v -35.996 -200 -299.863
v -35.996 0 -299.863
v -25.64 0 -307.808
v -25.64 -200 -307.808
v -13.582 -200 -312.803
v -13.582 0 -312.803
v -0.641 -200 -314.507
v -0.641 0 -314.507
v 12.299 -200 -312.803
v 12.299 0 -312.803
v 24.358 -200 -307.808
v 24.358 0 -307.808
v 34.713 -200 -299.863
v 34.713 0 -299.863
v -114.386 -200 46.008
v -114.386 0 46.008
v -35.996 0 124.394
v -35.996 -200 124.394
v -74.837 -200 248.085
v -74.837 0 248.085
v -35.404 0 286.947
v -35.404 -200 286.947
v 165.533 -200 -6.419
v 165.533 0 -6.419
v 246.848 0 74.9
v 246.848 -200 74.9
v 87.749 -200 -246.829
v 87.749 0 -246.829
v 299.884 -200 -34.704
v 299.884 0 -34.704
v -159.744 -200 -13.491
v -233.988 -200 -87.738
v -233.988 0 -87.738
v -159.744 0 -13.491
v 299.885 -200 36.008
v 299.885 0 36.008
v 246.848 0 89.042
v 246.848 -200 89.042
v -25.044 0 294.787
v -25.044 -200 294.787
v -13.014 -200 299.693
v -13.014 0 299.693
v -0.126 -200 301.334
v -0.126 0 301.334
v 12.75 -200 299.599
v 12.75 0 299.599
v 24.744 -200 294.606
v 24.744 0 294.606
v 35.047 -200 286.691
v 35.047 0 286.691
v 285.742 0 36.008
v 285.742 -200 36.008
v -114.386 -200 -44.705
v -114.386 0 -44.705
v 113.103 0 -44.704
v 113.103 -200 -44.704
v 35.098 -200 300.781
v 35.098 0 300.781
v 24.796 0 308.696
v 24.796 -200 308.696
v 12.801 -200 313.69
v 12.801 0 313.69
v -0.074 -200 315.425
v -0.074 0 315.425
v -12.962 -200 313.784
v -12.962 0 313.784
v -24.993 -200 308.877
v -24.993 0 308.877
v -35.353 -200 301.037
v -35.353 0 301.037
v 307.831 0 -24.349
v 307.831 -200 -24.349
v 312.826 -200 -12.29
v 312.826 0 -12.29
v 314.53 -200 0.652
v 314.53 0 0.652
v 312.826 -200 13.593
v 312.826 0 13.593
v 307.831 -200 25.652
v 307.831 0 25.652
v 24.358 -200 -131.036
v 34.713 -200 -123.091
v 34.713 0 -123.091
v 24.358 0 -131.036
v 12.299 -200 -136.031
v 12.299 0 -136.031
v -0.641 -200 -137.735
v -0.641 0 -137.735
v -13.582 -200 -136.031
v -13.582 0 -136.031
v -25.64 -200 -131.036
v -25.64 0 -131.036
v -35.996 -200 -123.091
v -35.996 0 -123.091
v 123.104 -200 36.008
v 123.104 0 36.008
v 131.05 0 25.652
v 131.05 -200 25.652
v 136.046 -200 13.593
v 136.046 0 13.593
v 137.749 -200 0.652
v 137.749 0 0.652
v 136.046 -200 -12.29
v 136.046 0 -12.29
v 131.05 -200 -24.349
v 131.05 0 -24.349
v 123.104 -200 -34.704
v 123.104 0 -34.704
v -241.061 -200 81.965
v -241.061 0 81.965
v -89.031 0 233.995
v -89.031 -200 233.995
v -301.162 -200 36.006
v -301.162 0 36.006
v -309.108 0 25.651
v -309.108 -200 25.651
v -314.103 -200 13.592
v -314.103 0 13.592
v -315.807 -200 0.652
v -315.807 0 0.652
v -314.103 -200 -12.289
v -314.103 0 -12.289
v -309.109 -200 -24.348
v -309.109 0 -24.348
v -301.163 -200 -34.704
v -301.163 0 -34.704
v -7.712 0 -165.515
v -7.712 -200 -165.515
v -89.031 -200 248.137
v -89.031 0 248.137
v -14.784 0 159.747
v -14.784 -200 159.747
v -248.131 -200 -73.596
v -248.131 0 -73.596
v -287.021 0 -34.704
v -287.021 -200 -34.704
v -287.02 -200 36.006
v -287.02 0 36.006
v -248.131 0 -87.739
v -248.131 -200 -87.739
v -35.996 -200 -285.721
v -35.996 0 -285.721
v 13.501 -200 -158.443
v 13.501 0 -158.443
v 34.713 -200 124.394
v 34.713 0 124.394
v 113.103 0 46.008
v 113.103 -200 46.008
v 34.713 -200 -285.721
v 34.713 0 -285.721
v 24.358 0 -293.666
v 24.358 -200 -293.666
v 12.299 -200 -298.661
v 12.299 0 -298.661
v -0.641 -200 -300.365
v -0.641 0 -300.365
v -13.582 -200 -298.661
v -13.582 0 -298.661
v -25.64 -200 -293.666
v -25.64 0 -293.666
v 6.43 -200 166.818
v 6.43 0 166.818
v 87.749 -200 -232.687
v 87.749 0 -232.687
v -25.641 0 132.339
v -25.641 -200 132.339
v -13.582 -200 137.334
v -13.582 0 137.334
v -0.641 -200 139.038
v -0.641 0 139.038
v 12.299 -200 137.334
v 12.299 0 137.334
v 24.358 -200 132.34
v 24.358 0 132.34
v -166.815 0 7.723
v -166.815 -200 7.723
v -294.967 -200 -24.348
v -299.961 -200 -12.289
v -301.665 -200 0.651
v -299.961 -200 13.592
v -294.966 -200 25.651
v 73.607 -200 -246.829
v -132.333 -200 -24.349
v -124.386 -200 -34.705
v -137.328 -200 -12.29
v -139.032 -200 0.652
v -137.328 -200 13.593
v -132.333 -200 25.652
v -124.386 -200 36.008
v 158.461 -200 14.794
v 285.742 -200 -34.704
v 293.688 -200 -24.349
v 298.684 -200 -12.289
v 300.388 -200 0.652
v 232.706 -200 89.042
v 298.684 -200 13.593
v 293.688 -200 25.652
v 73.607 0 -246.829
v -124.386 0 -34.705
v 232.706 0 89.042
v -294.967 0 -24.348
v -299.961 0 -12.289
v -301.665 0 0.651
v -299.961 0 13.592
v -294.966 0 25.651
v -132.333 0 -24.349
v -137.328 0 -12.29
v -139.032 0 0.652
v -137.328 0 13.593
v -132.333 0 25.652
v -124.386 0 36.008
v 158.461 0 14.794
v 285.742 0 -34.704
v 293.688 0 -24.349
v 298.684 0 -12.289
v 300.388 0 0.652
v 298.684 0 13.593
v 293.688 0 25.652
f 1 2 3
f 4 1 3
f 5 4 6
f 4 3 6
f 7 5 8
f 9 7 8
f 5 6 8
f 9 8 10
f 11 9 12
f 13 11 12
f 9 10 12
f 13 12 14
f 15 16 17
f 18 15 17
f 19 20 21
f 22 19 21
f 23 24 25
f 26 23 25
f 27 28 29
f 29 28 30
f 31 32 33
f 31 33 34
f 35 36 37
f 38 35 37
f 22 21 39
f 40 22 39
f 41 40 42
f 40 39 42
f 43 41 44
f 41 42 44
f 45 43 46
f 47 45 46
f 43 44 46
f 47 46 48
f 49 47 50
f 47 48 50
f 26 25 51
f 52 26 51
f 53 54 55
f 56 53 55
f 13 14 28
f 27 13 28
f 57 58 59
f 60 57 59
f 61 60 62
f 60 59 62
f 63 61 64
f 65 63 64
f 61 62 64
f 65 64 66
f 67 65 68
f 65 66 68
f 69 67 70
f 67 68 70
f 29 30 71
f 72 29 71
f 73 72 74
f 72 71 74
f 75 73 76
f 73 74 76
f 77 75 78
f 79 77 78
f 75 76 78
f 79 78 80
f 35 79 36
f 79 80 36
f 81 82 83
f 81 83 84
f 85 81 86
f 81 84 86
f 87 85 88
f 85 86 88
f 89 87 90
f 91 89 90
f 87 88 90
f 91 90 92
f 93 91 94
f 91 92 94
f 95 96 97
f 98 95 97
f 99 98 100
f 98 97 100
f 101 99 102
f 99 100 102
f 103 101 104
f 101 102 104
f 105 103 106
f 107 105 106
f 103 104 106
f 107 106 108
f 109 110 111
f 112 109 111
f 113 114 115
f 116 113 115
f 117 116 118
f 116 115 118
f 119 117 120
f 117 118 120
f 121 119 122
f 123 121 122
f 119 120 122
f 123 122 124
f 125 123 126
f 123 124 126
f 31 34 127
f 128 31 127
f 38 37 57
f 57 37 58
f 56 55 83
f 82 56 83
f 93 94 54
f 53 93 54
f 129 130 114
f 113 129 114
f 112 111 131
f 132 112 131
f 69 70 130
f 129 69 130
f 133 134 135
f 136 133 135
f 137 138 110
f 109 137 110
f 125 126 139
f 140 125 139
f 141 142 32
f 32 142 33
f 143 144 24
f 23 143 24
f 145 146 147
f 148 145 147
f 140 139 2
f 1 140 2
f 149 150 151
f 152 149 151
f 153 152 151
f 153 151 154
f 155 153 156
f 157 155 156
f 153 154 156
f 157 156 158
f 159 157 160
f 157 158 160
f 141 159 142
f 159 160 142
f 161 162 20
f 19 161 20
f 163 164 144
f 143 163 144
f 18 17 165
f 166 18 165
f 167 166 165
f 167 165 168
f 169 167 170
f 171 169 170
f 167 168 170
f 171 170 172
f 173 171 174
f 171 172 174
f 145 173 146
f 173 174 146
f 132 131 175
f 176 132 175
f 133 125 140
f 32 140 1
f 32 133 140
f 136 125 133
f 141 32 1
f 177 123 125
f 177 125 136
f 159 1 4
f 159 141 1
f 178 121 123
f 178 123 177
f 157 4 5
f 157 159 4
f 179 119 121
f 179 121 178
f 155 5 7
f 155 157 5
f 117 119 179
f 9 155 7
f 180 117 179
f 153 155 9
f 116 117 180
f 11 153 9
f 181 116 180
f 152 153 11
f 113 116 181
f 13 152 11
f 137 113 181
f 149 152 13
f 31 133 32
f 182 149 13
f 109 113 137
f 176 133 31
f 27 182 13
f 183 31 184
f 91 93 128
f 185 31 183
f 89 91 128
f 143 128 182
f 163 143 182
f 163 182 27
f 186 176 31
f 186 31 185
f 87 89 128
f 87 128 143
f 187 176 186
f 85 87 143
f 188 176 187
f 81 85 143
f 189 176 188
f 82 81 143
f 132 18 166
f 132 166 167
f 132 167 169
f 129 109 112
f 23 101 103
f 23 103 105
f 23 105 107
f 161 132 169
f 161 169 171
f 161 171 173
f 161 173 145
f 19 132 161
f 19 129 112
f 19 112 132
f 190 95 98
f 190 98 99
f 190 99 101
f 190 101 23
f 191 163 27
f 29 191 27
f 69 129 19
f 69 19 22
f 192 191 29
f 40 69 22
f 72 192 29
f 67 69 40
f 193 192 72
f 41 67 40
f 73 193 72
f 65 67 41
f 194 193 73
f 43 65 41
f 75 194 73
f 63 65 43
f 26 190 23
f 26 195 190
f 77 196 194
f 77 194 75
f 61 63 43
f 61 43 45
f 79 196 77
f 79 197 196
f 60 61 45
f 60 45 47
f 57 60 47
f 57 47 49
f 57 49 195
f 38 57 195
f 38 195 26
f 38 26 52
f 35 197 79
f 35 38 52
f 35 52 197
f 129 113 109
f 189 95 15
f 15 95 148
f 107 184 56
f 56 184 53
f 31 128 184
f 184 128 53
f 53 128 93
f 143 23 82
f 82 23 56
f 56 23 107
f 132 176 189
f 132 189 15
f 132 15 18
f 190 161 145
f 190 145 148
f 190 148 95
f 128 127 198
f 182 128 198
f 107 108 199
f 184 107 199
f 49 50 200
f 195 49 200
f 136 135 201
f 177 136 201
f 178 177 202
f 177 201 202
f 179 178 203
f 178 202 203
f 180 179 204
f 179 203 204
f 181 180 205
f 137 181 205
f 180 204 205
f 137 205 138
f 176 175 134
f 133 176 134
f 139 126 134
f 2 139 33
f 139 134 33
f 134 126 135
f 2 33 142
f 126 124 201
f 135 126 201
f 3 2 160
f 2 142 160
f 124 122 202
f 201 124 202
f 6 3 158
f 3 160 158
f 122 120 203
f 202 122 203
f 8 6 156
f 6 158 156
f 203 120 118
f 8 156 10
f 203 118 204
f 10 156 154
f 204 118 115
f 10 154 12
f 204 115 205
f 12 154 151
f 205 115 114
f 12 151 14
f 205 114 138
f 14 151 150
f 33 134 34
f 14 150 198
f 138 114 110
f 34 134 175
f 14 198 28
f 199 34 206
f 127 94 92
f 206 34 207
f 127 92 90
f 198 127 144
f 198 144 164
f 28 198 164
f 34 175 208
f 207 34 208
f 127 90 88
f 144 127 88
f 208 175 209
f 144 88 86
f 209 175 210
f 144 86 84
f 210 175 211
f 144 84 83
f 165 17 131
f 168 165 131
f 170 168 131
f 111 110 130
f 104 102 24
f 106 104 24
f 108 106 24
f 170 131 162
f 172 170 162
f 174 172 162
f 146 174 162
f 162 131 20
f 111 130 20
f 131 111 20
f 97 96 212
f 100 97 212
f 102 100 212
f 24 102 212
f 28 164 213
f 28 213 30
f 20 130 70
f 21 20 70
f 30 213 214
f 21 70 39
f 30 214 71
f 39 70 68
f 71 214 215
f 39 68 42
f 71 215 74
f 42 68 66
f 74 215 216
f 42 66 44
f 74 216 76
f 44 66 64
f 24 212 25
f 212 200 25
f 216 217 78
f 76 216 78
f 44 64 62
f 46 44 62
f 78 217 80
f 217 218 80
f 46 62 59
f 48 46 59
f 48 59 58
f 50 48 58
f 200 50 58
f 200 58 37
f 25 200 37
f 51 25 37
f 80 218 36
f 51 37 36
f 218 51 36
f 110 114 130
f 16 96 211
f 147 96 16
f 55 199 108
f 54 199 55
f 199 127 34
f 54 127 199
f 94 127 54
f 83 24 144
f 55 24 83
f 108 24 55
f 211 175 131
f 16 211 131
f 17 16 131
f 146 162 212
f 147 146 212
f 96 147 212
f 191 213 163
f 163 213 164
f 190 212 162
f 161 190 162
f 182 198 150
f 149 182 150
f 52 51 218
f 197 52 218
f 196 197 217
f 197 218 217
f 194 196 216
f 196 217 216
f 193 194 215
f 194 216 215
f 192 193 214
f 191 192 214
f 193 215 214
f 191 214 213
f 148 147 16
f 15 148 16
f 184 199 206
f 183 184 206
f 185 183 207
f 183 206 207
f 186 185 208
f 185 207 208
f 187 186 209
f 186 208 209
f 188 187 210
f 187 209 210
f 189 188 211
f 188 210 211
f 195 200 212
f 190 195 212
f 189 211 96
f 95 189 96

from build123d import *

# Parameters (mm, degrees)
F1_DEPTH = 200
F2_DEPTH = 200


with BuildPart() as f1:
    # F0 (on Front) → F1 (new body)
    with BuildSketch(Plane.XZ):
        with BuildLine():
            Line((299.884558, 36.007969), (246.847851, 89.042397))
            Line((246.847851, 89.042397), (35.098199, 300.781197))
            ThreePointArc((35.098199, 300.781197), (-0.074387, 315.424621), (-35.352556, 301.037423))
            Line((-35.352556, 301.037423), (-89.03118, 248.136791))
            Line((-89.03118, 248.136791), (-301.162203, 36.006278))
            ThreePointArc((-301.162203, 36.006278), (-315.806906, 0.651524), (-301.16309, -34.703597))
            Line((-301.16309, -34.703597), (-248.130547, -87.738676))
            Line((-248.130547, -87.738676), (-35.995554, -299.862797))
            ThreePointArc((-35.995554, -299.862797), (-0.641078, -314.506552), (34.713373, -299.862736))
            Line((34.713373, -299.862736), (87.7494, -246.829244))
            Line((87.7494, -246.829244), (299.884472, -34.704314))
            ThreePointArc((299.884472, -34.704314), (314.529978, 0.651809), (299.884558, 36.007969))
        make_face()
        with BuildLine():
            Line((73.606909, -246.829261), (34.71336, -285.72095))
            ThreePointArc((34.71336, -285.72095), (-0.64109, -300.364766), (-35.995566, -285.721011))
            Line((-35.995566, -285.721011), (-233.988382, -87.738343))
            Line((-233.988382, -87.738343), (-159.74383, -13.490596))
            Line((-159.74383, -13.490596), (-7.711945, -165.514689))
            Line((-7.711945, -165.514689), (73.606909, -246.829261))
        make_face(mode=Mode.SUBTRACT)
        with BuildLine():
            Line((246.848184, 74.900232), (285.742101, 36.007986))
            ThreePointArc((285.742101, 36.007986), (300.387522, 0.651827), (285.742016, -34.704297))
            Line((285.742016, -34.704297), (87.749383, -232.687464))
            Line((87.749383, -232.687464), (13.50143, -158.443421))
            Line((13.50143, -158.443421), (165.532843, -6.419277))
            Line((165.532843, -6.419277), (246.848184, 74.900232))
        make_face(mode=Mode.SUBTRACT)
        with BuildLine():
            Line((-166.815223, 7.722587), (-248.13053, -73.596219))
            Line((-248.13053, -73.596219), (-287.021115, -34.703775))
            ThreePointArc((-287.021115, -34.703775), (-301.664931, 0.651347), (-287.020228, 36.006101))
            Line((-287.020228, 36.006101), (-241.061024, 81.965194))
            Line((-241.061024, 81.965194), (-89.031197, 233.994655))
            Line((-89.031197, 233.994655), (-14.78363, 159.74691))
            Line((-14.78363, 159.74691), (-166.815223, 7.722587))
        make_face(mode=Mode.SUBTRACT)
        with BuildLine():
            Line((113.103268, 46.00796), (123.103772, 36.007969))
            ThreePointArc((123.103772, 36.007969), (137.749339, 0.651767), (123.103833, -34.704461))
            Line((123.103833, -34.704461), (113.103346, -44.704469))
            Line((113.103346, -44.704469), (34.713373, -123.090695))
            ThreePointArc((34.713373, -123.090695), (-0.641078, -137.734511), (-35.995554, -123.090756))
            Line((-35.995554, -123.090756), (-114.385663, -44.704665))
            Line((-114.385663, -44.704665), (-124.386167, -34.704674))
            ThreePointArc((-124.386167, -34.704674), (-139.031734, 0.651528), (-124.386228, 36.007756))
            Line((-124.386228, 36.007756), (-114.385741, 46.007764))
            Line((-114.385741, 46.007764), (-35.995767, 124.39399))
            ThreePointArc((-35.995767, 124.39399), (-0.641316, 139.037806), (34.71316, 124.394051))
            Line((34.71316, 124.394051), (113.103268, 46.00796))
        make_face(mode=Mode.SUBTRACT)
        with BuildLine():
            Line((-74.837248, 248.084978), (-35.403803, 286.946894))
            ThreePointArc((-35.403803, 286.946894), (-0.125633, 301.334092), (35.046953, 286.690667))
            Line((35.046953, 286.690667), (232.705716, 89.042035))
            Line((232.705716, 89.042035), (158.461406, 14.79392))
            Line((158.461406, 14.79392), (6.429647, 166.817887))
            Line((6.429647, 166.817887), (-74.837248, 248.084978))
        make_face(mode=Mode.SUBTRACT)
    extrude(amount=F1_DEPTH)

    # F0 (on Front) → F2 (join)
    with BuildSketch(Plane.XZ):
        Polygon((-124.386228, 36.007756), (123.103772, 36.007969), (113.103268, 46.00796), (-114.385741, 46.007764), align=None)
        Polygon((113.103346, -44.704469), (123.103833, -34.704461), (-124.386167, -34.704674), (-114.385663, -44.704665), align=None)
    extrude(amount=F2_DEPTH)


solid = f1.part
